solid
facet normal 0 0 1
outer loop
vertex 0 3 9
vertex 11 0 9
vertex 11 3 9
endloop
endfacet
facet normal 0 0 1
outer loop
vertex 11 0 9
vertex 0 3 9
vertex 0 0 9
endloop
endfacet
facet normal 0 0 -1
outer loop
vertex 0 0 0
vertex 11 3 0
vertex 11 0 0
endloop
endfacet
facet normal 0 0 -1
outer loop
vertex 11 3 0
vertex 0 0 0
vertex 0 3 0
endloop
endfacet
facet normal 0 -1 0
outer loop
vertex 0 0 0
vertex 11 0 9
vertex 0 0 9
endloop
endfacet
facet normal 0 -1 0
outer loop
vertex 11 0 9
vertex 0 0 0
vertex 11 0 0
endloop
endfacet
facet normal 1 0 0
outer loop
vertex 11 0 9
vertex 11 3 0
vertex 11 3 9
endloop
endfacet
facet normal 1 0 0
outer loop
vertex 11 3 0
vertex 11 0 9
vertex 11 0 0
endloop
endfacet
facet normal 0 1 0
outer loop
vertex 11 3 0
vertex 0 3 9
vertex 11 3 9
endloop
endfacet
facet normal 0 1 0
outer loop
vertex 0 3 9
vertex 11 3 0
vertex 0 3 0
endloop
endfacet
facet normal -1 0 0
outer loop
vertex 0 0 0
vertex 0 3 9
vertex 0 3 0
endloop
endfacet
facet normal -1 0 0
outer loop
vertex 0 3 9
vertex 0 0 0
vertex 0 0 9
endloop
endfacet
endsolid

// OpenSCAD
// Generated by SolidPython 1.0.1 on 2020-07-29 00:46:55


cube(size = [11, 3, 9]);
/***********************************************
*********      SolidPython code:      **********
************************************************
 
# import packages: SolidPython
from solid import *
from solid.utils import *
from itertools import chain, combinations, permutations


class Resize:

    def __init__(self, scad_file):
        self.scad_file = scad_file
        #self.scad_file = import_scad(scad_file)
        # cone/cylinder param:
        self.r1 = 0
        self.r2 = 0
        self.h = 0
        # rectangular prism param:
        self.w = 0
        self.l = 0
        # ellipse param:
        self.r = 0

    # import OpenScad code (file name corresponds to shape)


    # classify shape + parameters
    def assign(self, param1, param2, param3):
        if self.scad_file == 'cone.scad':
            self.r1 = param1
            self.r2 = param2
            self.h = param3
        elif self.scad_file == 'cylinder.scad':
            self.r1 = param1
            self.r2 = param2
            self.h = param3
        elif self.scad_file == 'rectangularPrism.scad':
            self.h = param1
            self.l = param2
            self.w = param3
        else:
            self.r = param1
            self.h = param2

    # resize parameters
    def iterate(self):
        x = range(3, 20, 2)
        i = 1
        if self.scad_file == 'cone.scad':
            tempList = list(permutations(x, 2))
            for temp in tempList:
                param1 = temp[0]
                param2 = temp[1]
                filepath = 'produced_scad_files/' + 'cone' + str(param1) + '_' + str(param2) + '_' + '.scad'
                scad_render_to_file(cylinder(h=param1, r1=param2, r2=0), filepath)

        elif self.scad_file == 'cylinder.scad':
            tempList = list(permutations(x, 3))
            for temp in tempList:
                param1 = temp[0]
                param2 = temp[1]
                filepath = 'produced_scad_files/' + 'cylinder' + str(param1) + '_' + str(param2) + '_' + '.scad'
                scad_render_to_file(cylinder(h=param1, r1=param2, r2=param2), filepath)

        elif self.scad_file == 'rectangularPrism.scad':
            tempList = list(permutations(x, 3))
            for temp in tempList:
                param1 = temp[0]
                param2 = temp[1]
                param3 = temp[2]
                filepath = 'produced_scad_files/' + 'rectangularPrism' + str(param1) + '_' + str(param2) + '_' + str(
                    param3) + '.scad'
                scad_render_to_file(cube(size=(param1, param2, param3)), filepath)

        elif self.scad_file == 'ellipse.scad':
            tempList = list(permutations(x, 4))
            for temp in tempList:
                param1 = temp[0]
                param2 = temp[1]
                param3 = temp[2]
                param4 = temp[3]
                filepath = 'produced_scad_files/' + 'ellipse' + str(param1) + '_' + str(param2) + '_' + str(param3) + '_' + str(param4) + '.scad'
                scad_render_to_file(scale([param1, param2, param3])(sphere(r=param4)), filepath)

    def render_to_scadfile(self):
        scad_render_to_file(scad, 'example.scad') 
 
************************************************/
